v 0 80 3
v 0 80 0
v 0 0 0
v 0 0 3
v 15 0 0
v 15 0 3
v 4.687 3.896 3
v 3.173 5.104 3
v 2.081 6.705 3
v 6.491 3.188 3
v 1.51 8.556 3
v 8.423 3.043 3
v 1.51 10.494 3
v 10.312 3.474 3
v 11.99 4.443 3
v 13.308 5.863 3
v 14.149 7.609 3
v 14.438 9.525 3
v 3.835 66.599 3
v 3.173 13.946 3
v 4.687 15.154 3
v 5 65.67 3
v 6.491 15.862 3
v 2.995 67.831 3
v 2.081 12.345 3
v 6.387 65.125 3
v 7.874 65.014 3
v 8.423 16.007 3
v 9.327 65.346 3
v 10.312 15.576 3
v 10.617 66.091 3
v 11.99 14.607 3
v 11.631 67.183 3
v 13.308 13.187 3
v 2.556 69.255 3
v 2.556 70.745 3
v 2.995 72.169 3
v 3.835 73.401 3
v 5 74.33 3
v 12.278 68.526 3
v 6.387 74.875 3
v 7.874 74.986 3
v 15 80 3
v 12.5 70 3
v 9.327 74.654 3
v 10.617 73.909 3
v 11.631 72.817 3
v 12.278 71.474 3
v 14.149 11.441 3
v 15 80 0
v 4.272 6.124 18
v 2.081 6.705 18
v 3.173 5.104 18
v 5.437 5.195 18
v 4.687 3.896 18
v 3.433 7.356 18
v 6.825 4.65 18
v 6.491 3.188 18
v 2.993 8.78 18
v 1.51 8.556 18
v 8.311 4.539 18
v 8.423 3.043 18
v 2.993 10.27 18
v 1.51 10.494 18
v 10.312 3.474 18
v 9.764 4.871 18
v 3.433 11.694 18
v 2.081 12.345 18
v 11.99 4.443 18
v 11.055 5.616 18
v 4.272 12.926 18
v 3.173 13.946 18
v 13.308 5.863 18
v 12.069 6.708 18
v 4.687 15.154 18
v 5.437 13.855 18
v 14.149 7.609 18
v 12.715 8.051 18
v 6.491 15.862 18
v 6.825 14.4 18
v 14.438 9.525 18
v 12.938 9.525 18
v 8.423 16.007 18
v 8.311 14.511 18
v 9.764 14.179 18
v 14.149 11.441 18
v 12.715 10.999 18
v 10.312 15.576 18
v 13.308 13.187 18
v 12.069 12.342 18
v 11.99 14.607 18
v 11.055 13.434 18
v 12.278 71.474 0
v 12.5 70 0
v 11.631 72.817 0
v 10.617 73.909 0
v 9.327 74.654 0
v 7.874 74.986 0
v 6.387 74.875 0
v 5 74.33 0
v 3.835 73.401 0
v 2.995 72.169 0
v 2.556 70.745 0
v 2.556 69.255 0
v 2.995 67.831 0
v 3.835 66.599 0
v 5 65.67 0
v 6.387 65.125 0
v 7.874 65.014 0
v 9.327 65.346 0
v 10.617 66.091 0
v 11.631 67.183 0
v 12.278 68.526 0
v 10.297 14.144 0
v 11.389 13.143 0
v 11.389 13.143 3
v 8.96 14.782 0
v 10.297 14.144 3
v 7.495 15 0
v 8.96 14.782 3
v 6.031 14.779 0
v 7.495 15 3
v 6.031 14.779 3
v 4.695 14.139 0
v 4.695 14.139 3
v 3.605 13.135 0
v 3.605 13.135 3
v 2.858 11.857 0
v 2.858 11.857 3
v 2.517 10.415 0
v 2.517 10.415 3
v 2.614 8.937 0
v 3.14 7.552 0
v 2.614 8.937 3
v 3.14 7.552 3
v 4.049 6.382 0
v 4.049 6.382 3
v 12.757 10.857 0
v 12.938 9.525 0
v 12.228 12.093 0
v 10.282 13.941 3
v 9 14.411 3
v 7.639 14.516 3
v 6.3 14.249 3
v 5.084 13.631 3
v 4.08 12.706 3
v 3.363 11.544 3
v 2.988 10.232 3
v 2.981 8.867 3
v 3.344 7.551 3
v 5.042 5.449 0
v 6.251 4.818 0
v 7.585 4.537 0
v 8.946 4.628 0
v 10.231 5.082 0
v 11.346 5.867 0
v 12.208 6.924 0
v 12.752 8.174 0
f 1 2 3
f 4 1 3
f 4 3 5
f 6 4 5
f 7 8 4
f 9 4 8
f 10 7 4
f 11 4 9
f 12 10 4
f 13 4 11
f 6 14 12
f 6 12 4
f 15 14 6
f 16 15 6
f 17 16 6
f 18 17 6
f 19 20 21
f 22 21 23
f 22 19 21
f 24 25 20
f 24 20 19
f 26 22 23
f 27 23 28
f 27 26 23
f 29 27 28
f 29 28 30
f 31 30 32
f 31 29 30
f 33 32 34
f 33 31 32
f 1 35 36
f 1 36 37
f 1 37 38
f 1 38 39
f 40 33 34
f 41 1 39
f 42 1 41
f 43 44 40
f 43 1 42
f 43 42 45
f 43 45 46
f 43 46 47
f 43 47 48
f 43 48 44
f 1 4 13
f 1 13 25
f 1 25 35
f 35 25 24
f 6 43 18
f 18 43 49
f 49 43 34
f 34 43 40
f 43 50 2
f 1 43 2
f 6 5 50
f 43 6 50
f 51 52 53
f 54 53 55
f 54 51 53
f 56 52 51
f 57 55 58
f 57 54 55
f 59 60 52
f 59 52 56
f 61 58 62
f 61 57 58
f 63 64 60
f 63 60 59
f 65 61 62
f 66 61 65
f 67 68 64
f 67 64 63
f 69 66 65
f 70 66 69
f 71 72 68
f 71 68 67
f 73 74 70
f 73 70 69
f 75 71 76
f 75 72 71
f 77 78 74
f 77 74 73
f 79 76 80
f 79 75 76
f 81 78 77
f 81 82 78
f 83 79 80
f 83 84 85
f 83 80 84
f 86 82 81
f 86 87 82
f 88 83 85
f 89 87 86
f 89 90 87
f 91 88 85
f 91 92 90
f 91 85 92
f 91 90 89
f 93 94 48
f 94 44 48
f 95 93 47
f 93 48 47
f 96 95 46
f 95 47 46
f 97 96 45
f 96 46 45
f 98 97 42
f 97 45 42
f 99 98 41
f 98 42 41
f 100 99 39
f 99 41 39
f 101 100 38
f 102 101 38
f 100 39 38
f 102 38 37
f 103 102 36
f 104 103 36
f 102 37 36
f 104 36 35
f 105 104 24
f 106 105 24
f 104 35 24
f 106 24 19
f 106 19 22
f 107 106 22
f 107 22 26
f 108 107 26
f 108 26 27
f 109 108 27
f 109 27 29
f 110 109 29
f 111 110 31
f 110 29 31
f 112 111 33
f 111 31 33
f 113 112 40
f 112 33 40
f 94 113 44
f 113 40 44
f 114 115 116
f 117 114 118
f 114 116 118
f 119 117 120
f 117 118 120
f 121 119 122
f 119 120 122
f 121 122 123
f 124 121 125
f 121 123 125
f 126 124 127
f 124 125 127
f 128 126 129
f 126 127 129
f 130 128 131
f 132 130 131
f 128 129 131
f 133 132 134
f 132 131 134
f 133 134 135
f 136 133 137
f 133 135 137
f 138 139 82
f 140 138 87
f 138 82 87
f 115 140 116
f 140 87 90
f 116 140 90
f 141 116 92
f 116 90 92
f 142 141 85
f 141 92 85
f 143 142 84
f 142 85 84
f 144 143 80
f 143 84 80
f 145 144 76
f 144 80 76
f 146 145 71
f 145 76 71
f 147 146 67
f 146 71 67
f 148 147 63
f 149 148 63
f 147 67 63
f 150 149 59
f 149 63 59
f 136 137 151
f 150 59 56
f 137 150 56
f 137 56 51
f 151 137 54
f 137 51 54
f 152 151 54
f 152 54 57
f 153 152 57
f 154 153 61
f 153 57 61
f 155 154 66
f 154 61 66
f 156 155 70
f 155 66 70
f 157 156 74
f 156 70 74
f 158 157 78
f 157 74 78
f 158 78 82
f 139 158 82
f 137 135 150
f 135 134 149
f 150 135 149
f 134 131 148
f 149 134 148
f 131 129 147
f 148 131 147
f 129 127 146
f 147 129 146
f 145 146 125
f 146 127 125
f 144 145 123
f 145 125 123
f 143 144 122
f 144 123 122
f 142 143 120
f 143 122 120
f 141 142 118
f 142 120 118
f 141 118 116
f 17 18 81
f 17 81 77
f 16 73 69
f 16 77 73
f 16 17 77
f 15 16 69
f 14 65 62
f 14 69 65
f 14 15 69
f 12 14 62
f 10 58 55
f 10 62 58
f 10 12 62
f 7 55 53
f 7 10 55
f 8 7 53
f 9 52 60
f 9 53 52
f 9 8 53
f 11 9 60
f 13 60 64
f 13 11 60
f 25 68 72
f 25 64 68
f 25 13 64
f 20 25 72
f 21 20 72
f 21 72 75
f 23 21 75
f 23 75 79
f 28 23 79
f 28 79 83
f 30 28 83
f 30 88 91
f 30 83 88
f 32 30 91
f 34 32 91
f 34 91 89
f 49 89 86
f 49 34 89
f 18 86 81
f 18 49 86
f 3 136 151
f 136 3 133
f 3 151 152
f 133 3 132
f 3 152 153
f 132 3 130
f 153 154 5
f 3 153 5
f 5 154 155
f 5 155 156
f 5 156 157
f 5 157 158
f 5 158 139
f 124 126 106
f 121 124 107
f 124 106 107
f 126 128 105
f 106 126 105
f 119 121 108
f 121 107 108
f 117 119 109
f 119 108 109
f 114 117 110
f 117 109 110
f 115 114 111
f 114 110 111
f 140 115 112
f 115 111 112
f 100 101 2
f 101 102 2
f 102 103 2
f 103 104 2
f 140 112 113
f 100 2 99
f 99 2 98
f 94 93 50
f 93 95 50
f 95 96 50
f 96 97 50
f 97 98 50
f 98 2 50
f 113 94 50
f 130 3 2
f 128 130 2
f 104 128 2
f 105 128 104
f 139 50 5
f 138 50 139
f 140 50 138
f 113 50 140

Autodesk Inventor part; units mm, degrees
ref_plane "YZ Plane" through (0, 0, 0) normal (1, 0, 0) x (0, 1, 0)
ref_plane "XZ Plane" through (0, 0, 0) normal (0, 1, 0) x (-1, 0, 0)
ref_plane "XY Plane" through (0, 0, 0) normal (0, 0, 1) x (1, 0, 0)
sketch "Sketch1" plane through (0, 0, 0) normal (0, 0, 1) x (1, 0, 0)
  point P0 (0, 0)
sketch "Sketch2" plane through (0, 0, 0) normal (0, 0, 1) x (1, 0, 0)
  line L0 (0, 0) -> (15, 0)
  line L1 (15, 0) -> (15, 80)
  line L2 (15, 80) -> (0, 80)
  line L3 (0, 80) -> (0, 0)
  dimension "d0" = 15
  dimension "d1" = 80
extrude "Extrusion1" add sketch "Sketch2" along normal blind 3
sketch "Sketch3" plane through (0, 0, 3) normal (0, 0, 1) x (1, 0, 0)
  line L0 (0, 0) -> (15, 0) projected
  line L1 (7.5, 0) -> (7.5, 10)
  line L2 (15, 80) -> (0, 80) projected
  line L3 (7.5, 80) -> (7.5, 70)
  circle A0 centre (7.5, 70) radius 5
  circle A1 centre (7.5, 10) radius 5
  dimension "d4" = 10
  dimension "d5" = 10
  dimension "d6" = 10
  dimension "d7" = 10
extrude "Extrusion2" cut sketch "Sketch3" against normal blind 10
sketch "Sketch4" plane through (0, 0, 3) normal (0, 0, 1) x (1, 0, 0)
  circle A0 centre (7.9375, 9.525) radius 6.5
  point P0 (0, 0)
  dimension "d10" = 13
extrude "Extrusion3" add sketch "Sketch4" along normal blind 15
sketch "Sketch5" plane through (7.9375, 9.525, 18) normal (0, 0, 1) x (1, 0, 0)
  circle A0 centre (0, 0) radius 5
  point P0 (-7.9375, -9.525)
  dimension "d13" = 10
extrude "Extrusion4" cut sketch "Sketch5" against normal through all
sketch "Sketch6" plane through (0, 0, 0) normal (1, 0, 0) x (0, 1, 0)
  line L0 (9.525, 17.4625) -> (9.525, 10.4625)
  circle A0 centre (9.525, 10.4625) radius 1.5
  point P0 (0, 0)
  dimension "d16" = 7
  dimension "d17" = 3
equation "\"d8\" = d7"
properties part number "crank for capping system"
